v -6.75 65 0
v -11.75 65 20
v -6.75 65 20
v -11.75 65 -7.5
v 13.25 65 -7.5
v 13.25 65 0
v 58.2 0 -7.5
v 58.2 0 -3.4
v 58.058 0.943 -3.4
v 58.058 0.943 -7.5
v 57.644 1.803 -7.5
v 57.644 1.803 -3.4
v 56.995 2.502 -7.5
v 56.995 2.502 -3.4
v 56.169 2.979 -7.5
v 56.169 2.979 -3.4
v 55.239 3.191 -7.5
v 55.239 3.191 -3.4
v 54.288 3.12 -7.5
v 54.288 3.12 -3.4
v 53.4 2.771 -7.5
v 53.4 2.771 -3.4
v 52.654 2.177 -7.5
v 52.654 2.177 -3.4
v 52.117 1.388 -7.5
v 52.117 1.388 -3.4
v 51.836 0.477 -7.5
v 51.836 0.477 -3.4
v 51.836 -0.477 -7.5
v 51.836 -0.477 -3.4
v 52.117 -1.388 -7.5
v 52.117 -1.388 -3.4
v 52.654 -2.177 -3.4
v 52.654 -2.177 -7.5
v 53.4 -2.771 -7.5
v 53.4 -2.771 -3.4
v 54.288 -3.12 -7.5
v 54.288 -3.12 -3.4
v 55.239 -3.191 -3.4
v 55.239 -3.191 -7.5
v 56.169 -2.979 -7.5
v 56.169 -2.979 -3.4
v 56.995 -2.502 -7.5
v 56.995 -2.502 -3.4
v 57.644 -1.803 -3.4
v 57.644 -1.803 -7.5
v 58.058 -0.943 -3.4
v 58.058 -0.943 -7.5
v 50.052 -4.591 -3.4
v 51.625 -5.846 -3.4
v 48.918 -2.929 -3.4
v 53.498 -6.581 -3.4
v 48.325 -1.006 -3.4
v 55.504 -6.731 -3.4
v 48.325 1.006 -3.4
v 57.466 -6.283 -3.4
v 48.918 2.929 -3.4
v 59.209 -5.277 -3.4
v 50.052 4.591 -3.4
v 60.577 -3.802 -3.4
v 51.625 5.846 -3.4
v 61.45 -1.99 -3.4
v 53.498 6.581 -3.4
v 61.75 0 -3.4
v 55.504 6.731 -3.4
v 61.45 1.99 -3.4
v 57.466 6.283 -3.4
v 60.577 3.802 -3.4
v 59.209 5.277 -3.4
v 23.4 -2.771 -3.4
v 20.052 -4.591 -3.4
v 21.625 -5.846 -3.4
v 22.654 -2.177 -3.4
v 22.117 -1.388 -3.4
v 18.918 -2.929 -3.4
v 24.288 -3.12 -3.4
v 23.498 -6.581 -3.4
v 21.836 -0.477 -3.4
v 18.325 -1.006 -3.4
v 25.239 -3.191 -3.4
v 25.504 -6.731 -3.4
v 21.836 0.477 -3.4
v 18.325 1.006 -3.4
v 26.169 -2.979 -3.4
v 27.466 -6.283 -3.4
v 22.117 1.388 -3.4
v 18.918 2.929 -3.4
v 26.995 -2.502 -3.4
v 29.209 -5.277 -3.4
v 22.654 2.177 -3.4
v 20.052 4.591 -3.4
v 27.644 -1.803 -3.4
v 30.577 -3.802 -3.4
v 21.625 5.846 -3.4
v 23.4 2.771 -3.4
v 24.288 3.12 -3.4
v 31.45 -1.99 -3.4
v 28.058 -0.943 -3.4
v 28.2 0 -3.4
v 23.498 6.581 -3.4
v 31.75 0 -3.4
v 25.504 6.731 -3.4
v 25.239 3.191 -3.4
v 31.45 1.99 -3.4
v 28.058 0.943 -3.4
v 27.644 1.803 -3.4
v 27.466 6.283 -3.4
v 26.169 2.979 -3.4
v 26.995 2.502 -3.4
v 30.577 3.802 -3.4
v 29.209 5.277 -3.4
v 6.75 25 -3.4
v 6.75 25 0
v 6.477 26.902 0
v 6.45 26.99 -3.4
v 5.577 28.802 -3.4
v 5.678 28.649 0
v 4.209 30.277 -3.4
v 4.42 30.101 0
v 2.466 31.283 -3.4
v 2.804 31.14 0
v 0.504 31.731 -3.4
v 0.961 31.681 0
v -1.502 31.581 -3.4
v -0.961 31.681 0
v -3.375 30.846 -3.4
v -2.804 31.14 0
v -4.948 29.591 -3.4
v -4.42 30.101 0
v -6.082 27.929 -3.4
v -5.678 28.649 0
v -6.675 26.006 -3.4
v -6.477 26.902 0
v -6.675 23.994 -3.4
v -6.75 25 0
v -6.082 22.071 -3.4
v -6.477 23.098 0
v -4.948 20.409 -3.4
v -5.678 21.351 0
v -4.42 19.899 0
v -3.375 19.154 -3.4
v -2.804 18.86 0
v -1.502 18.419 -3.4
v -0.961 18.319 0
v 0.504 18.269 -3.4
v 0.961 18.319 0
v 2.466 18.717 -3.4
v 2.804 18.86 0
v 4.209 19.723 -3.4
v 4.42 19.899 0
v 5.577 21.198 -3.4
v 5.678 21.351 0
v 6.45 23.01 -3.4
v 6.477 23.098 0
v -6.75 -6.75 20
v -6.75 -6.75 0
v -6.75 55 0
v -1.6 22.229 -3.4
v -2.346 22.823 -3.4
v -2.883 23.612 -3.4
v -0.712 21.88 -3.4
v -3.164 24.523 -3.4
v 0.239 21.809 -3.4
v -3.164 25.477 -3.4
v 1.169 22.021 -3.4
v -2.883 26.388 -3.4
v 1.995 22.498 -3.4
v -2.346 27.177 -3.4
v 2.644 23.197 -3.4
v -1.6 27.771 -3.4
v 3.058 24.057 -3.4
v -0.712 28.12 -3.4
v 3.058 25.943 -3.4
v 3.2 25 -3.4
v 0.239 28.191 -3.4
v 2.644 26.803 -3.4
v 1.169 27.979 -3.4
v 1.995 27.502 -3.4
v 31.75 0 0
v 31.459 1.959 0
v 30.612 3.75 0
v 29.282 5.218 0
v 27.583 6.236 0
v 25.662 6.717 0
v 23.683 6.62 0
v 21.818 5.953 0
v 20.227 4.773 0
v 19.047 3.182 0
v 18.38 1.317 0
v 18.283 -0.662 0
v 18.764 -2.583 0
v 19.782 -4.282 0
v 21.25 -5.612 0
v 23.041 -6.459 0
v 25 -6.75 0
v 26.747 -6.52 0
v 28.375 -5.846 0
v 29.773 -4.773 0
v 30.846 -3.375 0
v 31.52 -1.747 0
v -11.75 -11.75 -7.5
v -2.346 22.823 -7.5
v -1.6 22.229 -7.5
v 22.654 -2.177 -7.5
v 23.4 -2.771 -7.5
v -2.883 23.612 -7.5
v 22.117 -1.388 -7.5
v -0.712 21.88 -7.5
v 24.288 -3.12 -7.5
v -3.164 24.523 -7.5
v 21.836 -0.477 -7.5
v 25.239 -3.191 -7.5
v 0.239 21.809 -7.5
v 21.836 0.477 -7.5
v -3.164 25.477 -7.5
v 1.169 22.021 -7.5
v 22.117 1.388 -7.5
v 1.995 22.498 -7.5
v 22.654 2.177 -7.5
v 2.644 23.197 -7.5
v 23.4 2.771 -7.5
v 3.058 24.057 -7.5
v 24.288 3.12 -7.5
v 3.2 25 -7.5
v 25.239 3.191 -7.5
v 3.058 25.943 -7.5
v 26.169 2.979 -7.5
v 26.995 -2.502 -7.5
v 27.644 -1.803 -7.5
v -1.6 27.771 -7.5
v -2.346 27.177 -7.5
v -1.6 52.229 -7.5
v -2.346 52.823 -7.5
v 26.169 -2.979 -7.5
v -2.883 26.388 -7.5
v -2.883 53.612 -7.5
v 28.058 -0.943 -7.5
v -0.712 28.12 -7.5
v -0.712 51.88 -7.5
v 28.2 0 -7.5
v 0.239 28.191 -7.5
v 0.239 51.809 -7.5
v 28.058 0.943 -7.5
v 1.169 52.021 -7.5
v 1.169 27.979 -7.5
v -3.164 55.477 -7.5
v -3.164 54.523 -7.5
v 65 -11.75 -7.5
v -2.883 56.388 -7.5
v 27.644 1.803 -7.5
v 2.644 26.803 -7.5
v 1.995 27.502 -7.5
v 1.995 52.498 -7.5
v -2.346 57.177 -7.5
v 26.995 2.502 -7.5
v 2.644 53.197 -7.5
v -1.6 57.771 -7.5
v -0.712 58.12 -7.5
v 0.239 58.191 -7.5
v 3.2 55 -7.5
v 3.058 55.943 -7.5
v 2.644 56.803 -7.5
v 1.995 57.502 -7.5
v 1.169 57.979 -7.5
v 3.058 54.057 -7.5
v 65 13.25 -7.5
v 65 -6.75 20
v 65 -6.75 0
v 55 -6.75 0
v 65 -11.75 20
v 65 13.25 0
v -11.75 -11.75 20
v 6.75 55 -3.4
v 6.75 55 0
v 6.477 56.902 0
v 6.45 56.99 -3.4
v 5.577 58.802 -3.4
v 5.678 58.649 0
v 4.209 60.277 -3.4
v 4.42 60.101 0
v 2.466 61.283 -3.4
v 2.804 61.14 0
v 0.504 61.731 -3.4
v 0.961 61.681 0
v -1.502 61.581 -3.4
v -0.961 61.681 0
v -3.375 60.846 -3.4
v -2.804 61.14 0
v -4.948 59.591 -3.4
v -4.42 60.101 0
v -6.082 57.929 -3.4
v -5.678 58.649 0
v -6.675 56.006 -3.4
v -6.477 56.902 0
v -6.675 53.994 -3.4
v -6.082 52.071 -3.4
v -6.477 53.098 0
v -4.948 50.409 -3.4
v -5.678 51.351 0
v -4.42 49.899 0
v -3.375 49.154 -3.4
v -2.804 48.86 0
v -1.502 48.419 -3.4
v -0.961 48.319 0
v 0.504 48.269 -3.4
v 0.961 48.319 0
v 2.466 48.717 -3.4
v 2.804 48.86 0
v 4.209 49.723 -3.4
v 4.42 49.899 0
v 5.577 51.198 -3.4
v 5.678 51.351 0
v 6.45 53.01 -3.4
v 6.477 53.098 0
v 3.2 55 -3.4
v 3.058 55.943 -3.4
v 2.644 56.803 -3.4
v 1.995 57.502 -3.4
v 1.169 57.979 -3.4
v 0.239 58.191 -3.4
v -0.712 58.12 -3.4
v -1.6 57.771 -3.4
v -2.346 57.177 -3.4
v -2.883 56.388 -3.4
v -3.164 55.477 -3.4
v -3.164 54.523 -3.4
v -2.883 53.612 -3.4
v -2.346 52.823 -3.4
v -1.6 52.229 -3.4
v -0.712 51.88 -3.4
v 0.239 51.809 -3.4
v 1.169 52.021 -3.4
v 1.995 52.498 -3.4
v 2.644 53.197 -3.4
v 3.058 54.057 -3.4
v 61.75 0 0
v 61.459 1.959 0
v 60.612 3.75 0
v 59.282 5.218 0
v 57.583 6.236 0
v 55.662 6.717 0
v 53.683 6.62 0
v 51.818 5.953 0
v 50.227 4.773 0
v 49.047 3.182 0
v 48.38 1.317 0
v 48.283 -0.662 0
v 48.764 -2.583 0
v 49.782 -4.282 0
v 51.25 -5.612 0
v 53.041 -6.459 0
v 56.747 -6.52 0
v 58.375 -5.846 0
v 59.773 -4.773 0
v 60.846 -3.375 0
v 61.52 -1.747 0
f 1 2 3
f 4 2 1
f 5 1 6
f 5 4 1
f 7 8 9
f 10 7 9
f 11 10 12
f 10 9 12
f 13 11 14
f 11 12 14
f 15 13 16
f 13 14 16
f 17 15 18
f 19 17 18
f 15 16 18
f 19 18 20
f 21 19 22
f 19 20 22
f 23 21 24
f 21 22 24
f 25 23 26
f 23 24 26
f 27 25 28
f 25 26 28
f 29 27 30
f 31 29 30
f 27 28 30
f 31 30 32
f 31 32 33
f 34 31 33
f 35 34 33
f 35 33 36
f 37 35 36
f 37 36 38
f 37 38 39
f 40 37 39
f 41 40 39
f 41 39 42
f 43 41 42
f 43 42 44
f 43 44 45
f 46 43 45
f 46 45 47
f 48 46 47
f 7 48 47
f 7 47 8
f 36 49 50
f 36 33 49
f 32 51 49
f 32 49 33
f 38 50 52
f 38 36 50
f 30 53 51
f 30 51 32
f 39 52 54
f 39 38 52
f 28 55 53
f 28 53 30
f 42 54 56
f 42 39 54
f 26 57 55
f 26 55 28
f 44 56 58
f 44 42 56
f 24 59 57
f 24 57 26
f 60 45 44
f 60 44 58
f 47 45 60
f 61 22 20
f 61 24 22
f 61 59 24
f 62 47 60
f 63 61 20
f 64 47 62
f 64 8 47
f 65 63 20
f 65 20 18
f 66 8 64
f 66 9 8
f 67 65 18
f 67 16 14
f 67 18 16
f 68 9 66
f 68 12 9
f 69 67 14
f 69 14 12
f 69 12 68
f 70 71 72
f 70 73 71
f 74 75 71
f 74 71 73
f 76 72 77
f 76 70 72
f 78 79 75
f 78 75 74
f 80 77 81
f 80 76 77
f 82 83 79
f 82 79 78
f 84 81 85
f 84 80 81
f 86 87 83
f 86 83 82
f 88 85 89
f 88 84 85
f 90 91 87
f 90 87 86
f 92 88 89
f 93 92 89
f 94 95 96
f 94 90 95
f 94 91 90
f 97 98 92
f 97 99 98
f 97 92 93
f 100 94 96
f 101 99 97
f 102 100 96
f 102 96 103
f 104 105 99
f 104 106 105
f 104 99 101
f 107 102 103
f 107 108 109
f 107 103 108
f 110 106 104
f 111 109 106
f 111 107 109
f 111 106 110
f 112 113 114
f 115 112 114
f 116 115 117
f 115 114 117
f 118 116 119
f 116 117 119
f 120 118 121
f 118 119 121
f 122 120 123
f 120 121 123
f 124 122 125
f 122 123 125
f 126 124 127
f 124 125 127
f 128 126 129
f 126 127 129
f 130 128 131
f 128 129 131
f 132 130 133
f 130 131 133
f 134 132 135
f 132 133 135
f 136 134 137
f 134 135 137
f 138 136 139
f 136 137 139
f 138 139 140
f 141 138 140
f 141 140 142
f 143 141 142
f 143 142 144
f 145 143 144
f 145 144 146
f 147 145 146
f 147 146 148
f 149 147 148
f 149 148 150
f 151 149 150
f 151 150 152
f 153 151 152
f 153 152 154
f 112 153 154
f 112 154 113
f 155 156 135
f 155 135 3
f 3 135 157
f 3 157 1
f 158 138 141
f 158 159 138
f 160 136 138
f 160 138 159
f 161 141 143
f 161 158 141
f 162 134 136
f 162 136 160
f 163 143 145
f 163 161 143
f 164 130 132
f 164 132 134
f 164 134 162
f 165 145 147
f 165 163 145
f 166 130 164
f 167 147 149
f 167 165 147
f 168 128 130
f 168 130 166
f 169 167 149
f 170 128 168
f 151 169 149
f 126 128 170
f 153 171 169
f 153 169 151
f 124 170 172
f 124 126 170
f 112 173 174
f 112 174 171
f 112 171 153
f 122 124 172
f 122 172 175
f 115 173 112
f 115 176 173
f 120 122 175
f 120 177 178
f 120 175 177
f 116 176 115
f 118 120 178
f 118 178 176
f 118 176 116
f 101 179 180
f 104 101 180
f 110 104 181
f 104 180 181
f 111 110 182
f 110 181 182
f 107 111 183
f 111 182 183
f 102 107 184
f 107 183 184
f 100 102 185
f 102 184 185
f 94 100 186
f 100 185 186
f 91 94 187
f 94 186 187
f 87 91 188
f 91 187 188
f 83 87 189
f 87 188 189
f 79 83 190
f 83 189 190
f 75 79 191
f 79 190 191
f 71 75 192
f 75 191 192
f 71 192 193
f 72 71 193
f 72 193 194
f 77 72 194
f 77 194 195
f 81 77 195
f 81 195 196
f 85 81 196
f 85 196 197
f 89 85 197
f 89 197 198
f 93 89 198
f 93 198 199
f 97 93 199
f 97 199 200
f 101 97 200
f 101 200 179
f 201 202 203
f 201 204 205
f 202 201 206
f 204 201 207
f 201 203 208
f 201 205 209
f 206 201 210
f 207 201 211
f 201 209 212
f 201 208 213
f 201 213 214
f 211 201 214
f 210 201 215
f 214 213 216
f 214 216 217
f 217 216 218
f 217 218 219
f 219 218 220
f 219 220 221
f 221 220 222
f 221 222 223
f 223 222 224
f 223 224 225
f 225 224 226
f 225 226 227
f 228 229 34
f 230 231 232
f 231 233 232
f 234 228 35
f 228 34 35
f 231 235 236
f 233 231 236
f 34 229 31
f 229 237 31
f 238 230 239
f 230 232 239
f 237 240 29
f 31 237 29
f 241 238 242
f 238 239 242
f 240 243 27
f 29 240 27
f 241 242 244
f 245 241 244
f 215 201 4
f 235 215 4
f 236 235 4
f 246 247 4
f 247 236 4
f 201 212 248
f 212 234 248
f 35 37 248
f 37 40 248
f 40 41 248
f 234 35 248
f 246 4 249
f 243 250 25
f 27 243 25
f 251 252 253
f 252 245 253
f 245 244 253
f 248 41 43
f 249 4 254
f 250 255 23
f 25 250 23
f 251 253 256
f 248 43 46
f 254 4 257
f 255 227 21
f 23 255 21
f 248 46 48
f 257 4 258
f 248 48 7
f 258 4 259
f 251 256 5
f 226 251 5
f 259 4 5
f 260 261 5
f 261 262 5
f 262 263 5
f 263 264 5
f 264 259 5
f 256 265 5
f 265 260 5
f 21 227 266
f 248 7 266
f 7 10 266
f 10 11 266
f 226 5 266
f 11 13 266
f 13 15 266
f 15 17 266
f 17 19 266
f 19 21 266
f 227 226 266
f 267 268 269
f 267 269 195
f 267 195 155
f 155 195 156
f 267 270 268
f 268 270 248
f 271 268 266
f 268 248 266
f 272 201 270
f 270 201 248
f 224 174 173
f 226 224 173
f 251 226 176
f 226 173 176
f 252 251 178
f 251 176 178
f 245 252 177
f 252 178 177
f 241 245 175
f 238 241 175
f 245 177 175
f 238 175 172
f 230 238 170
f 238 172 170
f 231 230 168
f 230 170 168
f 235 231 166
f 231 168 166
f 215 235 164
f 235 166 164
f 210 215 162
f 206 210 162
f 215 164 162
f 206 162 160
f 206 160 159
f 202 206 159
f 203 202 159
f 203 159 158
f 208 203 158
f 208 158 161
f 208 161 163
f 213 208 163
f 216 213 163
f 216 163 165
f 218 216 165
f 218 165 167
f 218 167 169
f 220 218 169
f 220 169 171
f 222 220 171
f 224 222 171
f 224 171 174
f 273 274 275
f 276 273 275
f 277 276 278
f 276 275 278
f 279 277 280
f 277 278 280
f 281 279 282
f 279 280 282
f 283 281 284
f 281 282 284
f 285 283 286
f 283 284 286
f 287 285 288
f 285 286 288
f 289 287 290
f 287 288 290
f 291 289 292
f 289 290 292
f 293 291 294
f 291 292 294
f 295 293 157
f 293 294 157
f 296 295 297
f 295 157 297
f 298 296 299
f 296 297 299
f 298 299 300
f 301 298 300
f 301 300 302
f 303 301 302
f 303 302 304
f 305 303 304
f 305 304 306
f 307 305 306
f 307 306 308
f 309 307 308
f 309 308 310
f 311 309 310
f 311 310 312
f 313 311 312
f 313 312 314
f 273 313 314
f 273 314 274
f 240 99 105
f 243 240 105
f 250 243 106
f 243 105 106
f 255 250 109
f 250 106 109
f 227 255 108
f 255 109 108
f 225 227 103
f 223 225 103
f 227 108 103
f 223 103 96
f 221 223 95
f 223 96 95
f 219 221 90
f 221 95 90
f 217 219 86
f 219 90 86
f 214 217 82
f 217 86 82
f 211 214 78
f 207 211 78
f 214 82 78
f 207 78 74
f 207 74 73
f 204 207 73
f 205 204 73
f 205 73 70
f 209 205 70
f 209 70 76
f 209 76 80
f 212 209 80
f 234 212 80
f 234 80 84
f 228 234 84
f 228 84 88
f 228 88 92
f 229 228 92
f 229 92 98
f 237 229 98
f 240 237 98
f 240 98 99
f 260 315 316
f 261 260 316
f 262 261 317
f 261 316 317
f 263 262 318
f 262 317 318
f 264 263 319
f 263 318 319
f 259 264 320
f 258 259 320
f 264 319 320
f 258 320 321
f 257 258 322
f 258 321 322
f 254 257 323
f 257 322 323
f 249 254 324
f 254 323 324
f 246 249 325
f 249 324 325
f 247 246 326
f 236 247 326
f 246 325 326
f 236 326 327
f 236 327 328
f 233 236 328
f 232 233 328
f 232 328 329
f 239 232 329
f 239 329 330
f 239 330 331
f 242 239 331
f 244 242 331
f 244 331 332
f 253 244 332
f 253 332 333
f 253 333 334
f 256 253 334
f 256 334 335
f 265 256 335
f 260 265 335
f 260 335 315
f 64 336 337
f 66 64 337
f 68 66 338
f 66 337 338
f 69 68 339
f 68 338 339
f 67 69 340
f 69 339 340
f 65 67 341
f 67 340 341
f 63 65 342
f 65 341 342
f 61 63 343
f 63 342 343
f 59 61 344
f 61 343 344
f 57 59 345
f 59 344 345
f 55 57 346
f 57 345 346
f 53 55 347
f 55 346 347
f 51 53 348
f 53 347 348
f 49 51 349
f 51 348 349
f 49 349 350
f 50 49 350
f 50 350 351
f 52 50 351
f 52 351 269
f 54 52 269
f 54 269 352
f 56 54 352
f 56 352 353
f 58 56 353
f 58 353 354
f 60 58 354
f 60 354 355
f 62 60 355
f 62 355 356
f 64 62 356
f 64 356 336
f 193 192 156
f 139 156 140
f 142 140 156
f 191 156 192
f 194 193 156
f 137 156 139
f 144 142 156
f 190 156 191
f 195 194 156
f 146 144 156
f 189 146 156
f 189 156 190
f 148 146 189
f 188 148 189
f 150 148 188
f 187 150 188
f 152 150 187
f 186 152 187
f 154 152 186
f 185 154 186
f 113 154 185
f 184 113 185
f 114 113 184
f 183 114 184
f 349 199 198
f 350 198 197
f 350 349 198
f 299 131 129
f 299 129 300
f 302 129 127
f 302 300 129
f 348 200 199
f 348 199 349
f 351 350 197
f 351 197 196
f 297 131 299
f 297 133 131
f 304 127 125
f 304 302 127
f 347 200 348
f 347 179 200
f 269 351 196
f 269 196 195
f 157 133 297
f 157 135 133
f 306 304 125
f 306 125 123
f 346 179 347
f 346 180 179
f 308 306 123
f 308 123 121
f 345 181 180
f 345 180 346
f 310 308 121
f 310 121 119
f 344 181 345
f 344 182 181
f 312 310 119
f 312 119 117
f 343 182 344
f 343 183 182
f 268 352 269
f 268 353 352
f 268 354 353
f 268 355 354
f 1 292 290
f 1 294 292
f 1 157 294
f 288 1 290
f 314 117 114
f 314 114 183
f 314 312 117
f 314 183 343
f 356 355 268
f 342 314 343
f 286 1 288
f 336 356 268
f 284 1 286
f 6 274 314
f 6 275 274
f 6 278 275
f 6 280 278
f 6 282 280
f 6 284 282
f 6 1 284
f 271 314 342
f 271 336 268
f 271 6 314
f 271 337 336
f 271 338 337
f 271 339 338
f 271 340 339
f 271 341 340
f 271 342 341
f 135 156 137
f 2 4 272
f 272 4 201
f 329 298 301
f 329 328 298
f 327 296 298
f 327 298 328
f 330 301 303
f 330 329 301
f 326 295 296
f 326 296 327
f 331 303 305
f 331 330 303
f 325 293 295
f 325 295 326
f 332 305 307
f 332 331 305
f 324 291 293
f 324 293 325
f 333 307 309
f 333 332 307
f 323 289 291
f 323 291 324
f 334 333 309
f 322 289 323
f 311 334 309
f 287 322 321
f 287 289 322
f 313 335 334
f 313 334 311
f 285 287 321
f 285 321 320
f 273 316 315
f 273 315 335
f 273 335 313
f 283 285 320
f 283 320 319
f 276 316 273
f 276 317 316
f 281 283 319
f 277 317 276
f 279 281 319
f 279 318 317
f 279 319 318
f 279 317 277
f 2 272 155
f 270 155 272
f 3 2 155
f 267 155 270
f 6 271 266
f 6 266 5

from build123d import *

# Parameters (mm, degrees)
F1_W     = 51.75
F1_H     = 20
F2_DEPTH = 7.5
F3_W     = 5
F3_H     = 71.75
F4_DEPTH = 7.5
F0_R     = 6.75
F5_DEPTH = 3.4
F6_DEPTH = 20
F7_R     = 3.2
F8_DEPTH = 25


with BuildPart() as f2:
    # F1 (on Top) → F2 (new body)
    with BuildSketch(Plane.XY):
        Polygon((13.25, 65), (-6.75, 65), (-6.75, -6.75), (13.25, -6.75), (13.25, 13.25), align=None)
        Polygon((65, 13.25), (13.25, 65), (13.25, 13.25), align=None)
        with Locations((39.125, 3.25)):
            Rectangle(F1_W, F1_H)
    extrude(amount=-F2_DEPTH)

    # F3 (on face) → F4 (join)
    with BuildSketch(Plane.XY):
        with Locations((-9.25, 29.125)):
            Rectangle(F3_W, F3_H)
        Polygon((65, -6.75), (-6.75, -6.75), (-11.75, -6.75), (-11.75, -11.75), (65, -11.75), align=None)
    extrude(amount=-F4_DEPTH)

    # F0 (on Top) → F5 (cut)
    with BuildSketch(Plane.XY):
        with Locations((55, 0)):
            Circle(F0_R)
        with Locations((25, 0)):
            Circle(F0_R)
        with Locations((0, 25)):
            Circle(F0_R)
        with Locations((0, 55)):
            Circle(F0_R)
    extrude(amount=-F5_DEPTH, mode=Mode.SUBTRACT)

    # F3 (on face) → F6 (join)
    with BuildSketch(Plane.XY):
        with Locations((-9.25, 29.125)):
            Rectangle(F3_W, F3_H)
        Polygon((65, -6.75), (-6.75, -6.75), (-11.75, -6.75), (-11.75, -11.75), (65, -11.75), align=None)
    extrude(amount=F6_DEPTH)

    # F7 (on face) → F8 (cut)
    with BuildSketch(Plane.XY):
        with Locations((0, 25)):
            Circle(F7_R)
        with Locations((0, 55)):
            Circle(F7_R)
        with Locations((25, 0)):
            Circle(F7_R)
        with Locations((55, 0)):
            Circle(F7_R)
    extrude(amount=-F8_DEPTH, mode=Mode.SUBTRACT)


solid = f2.part
